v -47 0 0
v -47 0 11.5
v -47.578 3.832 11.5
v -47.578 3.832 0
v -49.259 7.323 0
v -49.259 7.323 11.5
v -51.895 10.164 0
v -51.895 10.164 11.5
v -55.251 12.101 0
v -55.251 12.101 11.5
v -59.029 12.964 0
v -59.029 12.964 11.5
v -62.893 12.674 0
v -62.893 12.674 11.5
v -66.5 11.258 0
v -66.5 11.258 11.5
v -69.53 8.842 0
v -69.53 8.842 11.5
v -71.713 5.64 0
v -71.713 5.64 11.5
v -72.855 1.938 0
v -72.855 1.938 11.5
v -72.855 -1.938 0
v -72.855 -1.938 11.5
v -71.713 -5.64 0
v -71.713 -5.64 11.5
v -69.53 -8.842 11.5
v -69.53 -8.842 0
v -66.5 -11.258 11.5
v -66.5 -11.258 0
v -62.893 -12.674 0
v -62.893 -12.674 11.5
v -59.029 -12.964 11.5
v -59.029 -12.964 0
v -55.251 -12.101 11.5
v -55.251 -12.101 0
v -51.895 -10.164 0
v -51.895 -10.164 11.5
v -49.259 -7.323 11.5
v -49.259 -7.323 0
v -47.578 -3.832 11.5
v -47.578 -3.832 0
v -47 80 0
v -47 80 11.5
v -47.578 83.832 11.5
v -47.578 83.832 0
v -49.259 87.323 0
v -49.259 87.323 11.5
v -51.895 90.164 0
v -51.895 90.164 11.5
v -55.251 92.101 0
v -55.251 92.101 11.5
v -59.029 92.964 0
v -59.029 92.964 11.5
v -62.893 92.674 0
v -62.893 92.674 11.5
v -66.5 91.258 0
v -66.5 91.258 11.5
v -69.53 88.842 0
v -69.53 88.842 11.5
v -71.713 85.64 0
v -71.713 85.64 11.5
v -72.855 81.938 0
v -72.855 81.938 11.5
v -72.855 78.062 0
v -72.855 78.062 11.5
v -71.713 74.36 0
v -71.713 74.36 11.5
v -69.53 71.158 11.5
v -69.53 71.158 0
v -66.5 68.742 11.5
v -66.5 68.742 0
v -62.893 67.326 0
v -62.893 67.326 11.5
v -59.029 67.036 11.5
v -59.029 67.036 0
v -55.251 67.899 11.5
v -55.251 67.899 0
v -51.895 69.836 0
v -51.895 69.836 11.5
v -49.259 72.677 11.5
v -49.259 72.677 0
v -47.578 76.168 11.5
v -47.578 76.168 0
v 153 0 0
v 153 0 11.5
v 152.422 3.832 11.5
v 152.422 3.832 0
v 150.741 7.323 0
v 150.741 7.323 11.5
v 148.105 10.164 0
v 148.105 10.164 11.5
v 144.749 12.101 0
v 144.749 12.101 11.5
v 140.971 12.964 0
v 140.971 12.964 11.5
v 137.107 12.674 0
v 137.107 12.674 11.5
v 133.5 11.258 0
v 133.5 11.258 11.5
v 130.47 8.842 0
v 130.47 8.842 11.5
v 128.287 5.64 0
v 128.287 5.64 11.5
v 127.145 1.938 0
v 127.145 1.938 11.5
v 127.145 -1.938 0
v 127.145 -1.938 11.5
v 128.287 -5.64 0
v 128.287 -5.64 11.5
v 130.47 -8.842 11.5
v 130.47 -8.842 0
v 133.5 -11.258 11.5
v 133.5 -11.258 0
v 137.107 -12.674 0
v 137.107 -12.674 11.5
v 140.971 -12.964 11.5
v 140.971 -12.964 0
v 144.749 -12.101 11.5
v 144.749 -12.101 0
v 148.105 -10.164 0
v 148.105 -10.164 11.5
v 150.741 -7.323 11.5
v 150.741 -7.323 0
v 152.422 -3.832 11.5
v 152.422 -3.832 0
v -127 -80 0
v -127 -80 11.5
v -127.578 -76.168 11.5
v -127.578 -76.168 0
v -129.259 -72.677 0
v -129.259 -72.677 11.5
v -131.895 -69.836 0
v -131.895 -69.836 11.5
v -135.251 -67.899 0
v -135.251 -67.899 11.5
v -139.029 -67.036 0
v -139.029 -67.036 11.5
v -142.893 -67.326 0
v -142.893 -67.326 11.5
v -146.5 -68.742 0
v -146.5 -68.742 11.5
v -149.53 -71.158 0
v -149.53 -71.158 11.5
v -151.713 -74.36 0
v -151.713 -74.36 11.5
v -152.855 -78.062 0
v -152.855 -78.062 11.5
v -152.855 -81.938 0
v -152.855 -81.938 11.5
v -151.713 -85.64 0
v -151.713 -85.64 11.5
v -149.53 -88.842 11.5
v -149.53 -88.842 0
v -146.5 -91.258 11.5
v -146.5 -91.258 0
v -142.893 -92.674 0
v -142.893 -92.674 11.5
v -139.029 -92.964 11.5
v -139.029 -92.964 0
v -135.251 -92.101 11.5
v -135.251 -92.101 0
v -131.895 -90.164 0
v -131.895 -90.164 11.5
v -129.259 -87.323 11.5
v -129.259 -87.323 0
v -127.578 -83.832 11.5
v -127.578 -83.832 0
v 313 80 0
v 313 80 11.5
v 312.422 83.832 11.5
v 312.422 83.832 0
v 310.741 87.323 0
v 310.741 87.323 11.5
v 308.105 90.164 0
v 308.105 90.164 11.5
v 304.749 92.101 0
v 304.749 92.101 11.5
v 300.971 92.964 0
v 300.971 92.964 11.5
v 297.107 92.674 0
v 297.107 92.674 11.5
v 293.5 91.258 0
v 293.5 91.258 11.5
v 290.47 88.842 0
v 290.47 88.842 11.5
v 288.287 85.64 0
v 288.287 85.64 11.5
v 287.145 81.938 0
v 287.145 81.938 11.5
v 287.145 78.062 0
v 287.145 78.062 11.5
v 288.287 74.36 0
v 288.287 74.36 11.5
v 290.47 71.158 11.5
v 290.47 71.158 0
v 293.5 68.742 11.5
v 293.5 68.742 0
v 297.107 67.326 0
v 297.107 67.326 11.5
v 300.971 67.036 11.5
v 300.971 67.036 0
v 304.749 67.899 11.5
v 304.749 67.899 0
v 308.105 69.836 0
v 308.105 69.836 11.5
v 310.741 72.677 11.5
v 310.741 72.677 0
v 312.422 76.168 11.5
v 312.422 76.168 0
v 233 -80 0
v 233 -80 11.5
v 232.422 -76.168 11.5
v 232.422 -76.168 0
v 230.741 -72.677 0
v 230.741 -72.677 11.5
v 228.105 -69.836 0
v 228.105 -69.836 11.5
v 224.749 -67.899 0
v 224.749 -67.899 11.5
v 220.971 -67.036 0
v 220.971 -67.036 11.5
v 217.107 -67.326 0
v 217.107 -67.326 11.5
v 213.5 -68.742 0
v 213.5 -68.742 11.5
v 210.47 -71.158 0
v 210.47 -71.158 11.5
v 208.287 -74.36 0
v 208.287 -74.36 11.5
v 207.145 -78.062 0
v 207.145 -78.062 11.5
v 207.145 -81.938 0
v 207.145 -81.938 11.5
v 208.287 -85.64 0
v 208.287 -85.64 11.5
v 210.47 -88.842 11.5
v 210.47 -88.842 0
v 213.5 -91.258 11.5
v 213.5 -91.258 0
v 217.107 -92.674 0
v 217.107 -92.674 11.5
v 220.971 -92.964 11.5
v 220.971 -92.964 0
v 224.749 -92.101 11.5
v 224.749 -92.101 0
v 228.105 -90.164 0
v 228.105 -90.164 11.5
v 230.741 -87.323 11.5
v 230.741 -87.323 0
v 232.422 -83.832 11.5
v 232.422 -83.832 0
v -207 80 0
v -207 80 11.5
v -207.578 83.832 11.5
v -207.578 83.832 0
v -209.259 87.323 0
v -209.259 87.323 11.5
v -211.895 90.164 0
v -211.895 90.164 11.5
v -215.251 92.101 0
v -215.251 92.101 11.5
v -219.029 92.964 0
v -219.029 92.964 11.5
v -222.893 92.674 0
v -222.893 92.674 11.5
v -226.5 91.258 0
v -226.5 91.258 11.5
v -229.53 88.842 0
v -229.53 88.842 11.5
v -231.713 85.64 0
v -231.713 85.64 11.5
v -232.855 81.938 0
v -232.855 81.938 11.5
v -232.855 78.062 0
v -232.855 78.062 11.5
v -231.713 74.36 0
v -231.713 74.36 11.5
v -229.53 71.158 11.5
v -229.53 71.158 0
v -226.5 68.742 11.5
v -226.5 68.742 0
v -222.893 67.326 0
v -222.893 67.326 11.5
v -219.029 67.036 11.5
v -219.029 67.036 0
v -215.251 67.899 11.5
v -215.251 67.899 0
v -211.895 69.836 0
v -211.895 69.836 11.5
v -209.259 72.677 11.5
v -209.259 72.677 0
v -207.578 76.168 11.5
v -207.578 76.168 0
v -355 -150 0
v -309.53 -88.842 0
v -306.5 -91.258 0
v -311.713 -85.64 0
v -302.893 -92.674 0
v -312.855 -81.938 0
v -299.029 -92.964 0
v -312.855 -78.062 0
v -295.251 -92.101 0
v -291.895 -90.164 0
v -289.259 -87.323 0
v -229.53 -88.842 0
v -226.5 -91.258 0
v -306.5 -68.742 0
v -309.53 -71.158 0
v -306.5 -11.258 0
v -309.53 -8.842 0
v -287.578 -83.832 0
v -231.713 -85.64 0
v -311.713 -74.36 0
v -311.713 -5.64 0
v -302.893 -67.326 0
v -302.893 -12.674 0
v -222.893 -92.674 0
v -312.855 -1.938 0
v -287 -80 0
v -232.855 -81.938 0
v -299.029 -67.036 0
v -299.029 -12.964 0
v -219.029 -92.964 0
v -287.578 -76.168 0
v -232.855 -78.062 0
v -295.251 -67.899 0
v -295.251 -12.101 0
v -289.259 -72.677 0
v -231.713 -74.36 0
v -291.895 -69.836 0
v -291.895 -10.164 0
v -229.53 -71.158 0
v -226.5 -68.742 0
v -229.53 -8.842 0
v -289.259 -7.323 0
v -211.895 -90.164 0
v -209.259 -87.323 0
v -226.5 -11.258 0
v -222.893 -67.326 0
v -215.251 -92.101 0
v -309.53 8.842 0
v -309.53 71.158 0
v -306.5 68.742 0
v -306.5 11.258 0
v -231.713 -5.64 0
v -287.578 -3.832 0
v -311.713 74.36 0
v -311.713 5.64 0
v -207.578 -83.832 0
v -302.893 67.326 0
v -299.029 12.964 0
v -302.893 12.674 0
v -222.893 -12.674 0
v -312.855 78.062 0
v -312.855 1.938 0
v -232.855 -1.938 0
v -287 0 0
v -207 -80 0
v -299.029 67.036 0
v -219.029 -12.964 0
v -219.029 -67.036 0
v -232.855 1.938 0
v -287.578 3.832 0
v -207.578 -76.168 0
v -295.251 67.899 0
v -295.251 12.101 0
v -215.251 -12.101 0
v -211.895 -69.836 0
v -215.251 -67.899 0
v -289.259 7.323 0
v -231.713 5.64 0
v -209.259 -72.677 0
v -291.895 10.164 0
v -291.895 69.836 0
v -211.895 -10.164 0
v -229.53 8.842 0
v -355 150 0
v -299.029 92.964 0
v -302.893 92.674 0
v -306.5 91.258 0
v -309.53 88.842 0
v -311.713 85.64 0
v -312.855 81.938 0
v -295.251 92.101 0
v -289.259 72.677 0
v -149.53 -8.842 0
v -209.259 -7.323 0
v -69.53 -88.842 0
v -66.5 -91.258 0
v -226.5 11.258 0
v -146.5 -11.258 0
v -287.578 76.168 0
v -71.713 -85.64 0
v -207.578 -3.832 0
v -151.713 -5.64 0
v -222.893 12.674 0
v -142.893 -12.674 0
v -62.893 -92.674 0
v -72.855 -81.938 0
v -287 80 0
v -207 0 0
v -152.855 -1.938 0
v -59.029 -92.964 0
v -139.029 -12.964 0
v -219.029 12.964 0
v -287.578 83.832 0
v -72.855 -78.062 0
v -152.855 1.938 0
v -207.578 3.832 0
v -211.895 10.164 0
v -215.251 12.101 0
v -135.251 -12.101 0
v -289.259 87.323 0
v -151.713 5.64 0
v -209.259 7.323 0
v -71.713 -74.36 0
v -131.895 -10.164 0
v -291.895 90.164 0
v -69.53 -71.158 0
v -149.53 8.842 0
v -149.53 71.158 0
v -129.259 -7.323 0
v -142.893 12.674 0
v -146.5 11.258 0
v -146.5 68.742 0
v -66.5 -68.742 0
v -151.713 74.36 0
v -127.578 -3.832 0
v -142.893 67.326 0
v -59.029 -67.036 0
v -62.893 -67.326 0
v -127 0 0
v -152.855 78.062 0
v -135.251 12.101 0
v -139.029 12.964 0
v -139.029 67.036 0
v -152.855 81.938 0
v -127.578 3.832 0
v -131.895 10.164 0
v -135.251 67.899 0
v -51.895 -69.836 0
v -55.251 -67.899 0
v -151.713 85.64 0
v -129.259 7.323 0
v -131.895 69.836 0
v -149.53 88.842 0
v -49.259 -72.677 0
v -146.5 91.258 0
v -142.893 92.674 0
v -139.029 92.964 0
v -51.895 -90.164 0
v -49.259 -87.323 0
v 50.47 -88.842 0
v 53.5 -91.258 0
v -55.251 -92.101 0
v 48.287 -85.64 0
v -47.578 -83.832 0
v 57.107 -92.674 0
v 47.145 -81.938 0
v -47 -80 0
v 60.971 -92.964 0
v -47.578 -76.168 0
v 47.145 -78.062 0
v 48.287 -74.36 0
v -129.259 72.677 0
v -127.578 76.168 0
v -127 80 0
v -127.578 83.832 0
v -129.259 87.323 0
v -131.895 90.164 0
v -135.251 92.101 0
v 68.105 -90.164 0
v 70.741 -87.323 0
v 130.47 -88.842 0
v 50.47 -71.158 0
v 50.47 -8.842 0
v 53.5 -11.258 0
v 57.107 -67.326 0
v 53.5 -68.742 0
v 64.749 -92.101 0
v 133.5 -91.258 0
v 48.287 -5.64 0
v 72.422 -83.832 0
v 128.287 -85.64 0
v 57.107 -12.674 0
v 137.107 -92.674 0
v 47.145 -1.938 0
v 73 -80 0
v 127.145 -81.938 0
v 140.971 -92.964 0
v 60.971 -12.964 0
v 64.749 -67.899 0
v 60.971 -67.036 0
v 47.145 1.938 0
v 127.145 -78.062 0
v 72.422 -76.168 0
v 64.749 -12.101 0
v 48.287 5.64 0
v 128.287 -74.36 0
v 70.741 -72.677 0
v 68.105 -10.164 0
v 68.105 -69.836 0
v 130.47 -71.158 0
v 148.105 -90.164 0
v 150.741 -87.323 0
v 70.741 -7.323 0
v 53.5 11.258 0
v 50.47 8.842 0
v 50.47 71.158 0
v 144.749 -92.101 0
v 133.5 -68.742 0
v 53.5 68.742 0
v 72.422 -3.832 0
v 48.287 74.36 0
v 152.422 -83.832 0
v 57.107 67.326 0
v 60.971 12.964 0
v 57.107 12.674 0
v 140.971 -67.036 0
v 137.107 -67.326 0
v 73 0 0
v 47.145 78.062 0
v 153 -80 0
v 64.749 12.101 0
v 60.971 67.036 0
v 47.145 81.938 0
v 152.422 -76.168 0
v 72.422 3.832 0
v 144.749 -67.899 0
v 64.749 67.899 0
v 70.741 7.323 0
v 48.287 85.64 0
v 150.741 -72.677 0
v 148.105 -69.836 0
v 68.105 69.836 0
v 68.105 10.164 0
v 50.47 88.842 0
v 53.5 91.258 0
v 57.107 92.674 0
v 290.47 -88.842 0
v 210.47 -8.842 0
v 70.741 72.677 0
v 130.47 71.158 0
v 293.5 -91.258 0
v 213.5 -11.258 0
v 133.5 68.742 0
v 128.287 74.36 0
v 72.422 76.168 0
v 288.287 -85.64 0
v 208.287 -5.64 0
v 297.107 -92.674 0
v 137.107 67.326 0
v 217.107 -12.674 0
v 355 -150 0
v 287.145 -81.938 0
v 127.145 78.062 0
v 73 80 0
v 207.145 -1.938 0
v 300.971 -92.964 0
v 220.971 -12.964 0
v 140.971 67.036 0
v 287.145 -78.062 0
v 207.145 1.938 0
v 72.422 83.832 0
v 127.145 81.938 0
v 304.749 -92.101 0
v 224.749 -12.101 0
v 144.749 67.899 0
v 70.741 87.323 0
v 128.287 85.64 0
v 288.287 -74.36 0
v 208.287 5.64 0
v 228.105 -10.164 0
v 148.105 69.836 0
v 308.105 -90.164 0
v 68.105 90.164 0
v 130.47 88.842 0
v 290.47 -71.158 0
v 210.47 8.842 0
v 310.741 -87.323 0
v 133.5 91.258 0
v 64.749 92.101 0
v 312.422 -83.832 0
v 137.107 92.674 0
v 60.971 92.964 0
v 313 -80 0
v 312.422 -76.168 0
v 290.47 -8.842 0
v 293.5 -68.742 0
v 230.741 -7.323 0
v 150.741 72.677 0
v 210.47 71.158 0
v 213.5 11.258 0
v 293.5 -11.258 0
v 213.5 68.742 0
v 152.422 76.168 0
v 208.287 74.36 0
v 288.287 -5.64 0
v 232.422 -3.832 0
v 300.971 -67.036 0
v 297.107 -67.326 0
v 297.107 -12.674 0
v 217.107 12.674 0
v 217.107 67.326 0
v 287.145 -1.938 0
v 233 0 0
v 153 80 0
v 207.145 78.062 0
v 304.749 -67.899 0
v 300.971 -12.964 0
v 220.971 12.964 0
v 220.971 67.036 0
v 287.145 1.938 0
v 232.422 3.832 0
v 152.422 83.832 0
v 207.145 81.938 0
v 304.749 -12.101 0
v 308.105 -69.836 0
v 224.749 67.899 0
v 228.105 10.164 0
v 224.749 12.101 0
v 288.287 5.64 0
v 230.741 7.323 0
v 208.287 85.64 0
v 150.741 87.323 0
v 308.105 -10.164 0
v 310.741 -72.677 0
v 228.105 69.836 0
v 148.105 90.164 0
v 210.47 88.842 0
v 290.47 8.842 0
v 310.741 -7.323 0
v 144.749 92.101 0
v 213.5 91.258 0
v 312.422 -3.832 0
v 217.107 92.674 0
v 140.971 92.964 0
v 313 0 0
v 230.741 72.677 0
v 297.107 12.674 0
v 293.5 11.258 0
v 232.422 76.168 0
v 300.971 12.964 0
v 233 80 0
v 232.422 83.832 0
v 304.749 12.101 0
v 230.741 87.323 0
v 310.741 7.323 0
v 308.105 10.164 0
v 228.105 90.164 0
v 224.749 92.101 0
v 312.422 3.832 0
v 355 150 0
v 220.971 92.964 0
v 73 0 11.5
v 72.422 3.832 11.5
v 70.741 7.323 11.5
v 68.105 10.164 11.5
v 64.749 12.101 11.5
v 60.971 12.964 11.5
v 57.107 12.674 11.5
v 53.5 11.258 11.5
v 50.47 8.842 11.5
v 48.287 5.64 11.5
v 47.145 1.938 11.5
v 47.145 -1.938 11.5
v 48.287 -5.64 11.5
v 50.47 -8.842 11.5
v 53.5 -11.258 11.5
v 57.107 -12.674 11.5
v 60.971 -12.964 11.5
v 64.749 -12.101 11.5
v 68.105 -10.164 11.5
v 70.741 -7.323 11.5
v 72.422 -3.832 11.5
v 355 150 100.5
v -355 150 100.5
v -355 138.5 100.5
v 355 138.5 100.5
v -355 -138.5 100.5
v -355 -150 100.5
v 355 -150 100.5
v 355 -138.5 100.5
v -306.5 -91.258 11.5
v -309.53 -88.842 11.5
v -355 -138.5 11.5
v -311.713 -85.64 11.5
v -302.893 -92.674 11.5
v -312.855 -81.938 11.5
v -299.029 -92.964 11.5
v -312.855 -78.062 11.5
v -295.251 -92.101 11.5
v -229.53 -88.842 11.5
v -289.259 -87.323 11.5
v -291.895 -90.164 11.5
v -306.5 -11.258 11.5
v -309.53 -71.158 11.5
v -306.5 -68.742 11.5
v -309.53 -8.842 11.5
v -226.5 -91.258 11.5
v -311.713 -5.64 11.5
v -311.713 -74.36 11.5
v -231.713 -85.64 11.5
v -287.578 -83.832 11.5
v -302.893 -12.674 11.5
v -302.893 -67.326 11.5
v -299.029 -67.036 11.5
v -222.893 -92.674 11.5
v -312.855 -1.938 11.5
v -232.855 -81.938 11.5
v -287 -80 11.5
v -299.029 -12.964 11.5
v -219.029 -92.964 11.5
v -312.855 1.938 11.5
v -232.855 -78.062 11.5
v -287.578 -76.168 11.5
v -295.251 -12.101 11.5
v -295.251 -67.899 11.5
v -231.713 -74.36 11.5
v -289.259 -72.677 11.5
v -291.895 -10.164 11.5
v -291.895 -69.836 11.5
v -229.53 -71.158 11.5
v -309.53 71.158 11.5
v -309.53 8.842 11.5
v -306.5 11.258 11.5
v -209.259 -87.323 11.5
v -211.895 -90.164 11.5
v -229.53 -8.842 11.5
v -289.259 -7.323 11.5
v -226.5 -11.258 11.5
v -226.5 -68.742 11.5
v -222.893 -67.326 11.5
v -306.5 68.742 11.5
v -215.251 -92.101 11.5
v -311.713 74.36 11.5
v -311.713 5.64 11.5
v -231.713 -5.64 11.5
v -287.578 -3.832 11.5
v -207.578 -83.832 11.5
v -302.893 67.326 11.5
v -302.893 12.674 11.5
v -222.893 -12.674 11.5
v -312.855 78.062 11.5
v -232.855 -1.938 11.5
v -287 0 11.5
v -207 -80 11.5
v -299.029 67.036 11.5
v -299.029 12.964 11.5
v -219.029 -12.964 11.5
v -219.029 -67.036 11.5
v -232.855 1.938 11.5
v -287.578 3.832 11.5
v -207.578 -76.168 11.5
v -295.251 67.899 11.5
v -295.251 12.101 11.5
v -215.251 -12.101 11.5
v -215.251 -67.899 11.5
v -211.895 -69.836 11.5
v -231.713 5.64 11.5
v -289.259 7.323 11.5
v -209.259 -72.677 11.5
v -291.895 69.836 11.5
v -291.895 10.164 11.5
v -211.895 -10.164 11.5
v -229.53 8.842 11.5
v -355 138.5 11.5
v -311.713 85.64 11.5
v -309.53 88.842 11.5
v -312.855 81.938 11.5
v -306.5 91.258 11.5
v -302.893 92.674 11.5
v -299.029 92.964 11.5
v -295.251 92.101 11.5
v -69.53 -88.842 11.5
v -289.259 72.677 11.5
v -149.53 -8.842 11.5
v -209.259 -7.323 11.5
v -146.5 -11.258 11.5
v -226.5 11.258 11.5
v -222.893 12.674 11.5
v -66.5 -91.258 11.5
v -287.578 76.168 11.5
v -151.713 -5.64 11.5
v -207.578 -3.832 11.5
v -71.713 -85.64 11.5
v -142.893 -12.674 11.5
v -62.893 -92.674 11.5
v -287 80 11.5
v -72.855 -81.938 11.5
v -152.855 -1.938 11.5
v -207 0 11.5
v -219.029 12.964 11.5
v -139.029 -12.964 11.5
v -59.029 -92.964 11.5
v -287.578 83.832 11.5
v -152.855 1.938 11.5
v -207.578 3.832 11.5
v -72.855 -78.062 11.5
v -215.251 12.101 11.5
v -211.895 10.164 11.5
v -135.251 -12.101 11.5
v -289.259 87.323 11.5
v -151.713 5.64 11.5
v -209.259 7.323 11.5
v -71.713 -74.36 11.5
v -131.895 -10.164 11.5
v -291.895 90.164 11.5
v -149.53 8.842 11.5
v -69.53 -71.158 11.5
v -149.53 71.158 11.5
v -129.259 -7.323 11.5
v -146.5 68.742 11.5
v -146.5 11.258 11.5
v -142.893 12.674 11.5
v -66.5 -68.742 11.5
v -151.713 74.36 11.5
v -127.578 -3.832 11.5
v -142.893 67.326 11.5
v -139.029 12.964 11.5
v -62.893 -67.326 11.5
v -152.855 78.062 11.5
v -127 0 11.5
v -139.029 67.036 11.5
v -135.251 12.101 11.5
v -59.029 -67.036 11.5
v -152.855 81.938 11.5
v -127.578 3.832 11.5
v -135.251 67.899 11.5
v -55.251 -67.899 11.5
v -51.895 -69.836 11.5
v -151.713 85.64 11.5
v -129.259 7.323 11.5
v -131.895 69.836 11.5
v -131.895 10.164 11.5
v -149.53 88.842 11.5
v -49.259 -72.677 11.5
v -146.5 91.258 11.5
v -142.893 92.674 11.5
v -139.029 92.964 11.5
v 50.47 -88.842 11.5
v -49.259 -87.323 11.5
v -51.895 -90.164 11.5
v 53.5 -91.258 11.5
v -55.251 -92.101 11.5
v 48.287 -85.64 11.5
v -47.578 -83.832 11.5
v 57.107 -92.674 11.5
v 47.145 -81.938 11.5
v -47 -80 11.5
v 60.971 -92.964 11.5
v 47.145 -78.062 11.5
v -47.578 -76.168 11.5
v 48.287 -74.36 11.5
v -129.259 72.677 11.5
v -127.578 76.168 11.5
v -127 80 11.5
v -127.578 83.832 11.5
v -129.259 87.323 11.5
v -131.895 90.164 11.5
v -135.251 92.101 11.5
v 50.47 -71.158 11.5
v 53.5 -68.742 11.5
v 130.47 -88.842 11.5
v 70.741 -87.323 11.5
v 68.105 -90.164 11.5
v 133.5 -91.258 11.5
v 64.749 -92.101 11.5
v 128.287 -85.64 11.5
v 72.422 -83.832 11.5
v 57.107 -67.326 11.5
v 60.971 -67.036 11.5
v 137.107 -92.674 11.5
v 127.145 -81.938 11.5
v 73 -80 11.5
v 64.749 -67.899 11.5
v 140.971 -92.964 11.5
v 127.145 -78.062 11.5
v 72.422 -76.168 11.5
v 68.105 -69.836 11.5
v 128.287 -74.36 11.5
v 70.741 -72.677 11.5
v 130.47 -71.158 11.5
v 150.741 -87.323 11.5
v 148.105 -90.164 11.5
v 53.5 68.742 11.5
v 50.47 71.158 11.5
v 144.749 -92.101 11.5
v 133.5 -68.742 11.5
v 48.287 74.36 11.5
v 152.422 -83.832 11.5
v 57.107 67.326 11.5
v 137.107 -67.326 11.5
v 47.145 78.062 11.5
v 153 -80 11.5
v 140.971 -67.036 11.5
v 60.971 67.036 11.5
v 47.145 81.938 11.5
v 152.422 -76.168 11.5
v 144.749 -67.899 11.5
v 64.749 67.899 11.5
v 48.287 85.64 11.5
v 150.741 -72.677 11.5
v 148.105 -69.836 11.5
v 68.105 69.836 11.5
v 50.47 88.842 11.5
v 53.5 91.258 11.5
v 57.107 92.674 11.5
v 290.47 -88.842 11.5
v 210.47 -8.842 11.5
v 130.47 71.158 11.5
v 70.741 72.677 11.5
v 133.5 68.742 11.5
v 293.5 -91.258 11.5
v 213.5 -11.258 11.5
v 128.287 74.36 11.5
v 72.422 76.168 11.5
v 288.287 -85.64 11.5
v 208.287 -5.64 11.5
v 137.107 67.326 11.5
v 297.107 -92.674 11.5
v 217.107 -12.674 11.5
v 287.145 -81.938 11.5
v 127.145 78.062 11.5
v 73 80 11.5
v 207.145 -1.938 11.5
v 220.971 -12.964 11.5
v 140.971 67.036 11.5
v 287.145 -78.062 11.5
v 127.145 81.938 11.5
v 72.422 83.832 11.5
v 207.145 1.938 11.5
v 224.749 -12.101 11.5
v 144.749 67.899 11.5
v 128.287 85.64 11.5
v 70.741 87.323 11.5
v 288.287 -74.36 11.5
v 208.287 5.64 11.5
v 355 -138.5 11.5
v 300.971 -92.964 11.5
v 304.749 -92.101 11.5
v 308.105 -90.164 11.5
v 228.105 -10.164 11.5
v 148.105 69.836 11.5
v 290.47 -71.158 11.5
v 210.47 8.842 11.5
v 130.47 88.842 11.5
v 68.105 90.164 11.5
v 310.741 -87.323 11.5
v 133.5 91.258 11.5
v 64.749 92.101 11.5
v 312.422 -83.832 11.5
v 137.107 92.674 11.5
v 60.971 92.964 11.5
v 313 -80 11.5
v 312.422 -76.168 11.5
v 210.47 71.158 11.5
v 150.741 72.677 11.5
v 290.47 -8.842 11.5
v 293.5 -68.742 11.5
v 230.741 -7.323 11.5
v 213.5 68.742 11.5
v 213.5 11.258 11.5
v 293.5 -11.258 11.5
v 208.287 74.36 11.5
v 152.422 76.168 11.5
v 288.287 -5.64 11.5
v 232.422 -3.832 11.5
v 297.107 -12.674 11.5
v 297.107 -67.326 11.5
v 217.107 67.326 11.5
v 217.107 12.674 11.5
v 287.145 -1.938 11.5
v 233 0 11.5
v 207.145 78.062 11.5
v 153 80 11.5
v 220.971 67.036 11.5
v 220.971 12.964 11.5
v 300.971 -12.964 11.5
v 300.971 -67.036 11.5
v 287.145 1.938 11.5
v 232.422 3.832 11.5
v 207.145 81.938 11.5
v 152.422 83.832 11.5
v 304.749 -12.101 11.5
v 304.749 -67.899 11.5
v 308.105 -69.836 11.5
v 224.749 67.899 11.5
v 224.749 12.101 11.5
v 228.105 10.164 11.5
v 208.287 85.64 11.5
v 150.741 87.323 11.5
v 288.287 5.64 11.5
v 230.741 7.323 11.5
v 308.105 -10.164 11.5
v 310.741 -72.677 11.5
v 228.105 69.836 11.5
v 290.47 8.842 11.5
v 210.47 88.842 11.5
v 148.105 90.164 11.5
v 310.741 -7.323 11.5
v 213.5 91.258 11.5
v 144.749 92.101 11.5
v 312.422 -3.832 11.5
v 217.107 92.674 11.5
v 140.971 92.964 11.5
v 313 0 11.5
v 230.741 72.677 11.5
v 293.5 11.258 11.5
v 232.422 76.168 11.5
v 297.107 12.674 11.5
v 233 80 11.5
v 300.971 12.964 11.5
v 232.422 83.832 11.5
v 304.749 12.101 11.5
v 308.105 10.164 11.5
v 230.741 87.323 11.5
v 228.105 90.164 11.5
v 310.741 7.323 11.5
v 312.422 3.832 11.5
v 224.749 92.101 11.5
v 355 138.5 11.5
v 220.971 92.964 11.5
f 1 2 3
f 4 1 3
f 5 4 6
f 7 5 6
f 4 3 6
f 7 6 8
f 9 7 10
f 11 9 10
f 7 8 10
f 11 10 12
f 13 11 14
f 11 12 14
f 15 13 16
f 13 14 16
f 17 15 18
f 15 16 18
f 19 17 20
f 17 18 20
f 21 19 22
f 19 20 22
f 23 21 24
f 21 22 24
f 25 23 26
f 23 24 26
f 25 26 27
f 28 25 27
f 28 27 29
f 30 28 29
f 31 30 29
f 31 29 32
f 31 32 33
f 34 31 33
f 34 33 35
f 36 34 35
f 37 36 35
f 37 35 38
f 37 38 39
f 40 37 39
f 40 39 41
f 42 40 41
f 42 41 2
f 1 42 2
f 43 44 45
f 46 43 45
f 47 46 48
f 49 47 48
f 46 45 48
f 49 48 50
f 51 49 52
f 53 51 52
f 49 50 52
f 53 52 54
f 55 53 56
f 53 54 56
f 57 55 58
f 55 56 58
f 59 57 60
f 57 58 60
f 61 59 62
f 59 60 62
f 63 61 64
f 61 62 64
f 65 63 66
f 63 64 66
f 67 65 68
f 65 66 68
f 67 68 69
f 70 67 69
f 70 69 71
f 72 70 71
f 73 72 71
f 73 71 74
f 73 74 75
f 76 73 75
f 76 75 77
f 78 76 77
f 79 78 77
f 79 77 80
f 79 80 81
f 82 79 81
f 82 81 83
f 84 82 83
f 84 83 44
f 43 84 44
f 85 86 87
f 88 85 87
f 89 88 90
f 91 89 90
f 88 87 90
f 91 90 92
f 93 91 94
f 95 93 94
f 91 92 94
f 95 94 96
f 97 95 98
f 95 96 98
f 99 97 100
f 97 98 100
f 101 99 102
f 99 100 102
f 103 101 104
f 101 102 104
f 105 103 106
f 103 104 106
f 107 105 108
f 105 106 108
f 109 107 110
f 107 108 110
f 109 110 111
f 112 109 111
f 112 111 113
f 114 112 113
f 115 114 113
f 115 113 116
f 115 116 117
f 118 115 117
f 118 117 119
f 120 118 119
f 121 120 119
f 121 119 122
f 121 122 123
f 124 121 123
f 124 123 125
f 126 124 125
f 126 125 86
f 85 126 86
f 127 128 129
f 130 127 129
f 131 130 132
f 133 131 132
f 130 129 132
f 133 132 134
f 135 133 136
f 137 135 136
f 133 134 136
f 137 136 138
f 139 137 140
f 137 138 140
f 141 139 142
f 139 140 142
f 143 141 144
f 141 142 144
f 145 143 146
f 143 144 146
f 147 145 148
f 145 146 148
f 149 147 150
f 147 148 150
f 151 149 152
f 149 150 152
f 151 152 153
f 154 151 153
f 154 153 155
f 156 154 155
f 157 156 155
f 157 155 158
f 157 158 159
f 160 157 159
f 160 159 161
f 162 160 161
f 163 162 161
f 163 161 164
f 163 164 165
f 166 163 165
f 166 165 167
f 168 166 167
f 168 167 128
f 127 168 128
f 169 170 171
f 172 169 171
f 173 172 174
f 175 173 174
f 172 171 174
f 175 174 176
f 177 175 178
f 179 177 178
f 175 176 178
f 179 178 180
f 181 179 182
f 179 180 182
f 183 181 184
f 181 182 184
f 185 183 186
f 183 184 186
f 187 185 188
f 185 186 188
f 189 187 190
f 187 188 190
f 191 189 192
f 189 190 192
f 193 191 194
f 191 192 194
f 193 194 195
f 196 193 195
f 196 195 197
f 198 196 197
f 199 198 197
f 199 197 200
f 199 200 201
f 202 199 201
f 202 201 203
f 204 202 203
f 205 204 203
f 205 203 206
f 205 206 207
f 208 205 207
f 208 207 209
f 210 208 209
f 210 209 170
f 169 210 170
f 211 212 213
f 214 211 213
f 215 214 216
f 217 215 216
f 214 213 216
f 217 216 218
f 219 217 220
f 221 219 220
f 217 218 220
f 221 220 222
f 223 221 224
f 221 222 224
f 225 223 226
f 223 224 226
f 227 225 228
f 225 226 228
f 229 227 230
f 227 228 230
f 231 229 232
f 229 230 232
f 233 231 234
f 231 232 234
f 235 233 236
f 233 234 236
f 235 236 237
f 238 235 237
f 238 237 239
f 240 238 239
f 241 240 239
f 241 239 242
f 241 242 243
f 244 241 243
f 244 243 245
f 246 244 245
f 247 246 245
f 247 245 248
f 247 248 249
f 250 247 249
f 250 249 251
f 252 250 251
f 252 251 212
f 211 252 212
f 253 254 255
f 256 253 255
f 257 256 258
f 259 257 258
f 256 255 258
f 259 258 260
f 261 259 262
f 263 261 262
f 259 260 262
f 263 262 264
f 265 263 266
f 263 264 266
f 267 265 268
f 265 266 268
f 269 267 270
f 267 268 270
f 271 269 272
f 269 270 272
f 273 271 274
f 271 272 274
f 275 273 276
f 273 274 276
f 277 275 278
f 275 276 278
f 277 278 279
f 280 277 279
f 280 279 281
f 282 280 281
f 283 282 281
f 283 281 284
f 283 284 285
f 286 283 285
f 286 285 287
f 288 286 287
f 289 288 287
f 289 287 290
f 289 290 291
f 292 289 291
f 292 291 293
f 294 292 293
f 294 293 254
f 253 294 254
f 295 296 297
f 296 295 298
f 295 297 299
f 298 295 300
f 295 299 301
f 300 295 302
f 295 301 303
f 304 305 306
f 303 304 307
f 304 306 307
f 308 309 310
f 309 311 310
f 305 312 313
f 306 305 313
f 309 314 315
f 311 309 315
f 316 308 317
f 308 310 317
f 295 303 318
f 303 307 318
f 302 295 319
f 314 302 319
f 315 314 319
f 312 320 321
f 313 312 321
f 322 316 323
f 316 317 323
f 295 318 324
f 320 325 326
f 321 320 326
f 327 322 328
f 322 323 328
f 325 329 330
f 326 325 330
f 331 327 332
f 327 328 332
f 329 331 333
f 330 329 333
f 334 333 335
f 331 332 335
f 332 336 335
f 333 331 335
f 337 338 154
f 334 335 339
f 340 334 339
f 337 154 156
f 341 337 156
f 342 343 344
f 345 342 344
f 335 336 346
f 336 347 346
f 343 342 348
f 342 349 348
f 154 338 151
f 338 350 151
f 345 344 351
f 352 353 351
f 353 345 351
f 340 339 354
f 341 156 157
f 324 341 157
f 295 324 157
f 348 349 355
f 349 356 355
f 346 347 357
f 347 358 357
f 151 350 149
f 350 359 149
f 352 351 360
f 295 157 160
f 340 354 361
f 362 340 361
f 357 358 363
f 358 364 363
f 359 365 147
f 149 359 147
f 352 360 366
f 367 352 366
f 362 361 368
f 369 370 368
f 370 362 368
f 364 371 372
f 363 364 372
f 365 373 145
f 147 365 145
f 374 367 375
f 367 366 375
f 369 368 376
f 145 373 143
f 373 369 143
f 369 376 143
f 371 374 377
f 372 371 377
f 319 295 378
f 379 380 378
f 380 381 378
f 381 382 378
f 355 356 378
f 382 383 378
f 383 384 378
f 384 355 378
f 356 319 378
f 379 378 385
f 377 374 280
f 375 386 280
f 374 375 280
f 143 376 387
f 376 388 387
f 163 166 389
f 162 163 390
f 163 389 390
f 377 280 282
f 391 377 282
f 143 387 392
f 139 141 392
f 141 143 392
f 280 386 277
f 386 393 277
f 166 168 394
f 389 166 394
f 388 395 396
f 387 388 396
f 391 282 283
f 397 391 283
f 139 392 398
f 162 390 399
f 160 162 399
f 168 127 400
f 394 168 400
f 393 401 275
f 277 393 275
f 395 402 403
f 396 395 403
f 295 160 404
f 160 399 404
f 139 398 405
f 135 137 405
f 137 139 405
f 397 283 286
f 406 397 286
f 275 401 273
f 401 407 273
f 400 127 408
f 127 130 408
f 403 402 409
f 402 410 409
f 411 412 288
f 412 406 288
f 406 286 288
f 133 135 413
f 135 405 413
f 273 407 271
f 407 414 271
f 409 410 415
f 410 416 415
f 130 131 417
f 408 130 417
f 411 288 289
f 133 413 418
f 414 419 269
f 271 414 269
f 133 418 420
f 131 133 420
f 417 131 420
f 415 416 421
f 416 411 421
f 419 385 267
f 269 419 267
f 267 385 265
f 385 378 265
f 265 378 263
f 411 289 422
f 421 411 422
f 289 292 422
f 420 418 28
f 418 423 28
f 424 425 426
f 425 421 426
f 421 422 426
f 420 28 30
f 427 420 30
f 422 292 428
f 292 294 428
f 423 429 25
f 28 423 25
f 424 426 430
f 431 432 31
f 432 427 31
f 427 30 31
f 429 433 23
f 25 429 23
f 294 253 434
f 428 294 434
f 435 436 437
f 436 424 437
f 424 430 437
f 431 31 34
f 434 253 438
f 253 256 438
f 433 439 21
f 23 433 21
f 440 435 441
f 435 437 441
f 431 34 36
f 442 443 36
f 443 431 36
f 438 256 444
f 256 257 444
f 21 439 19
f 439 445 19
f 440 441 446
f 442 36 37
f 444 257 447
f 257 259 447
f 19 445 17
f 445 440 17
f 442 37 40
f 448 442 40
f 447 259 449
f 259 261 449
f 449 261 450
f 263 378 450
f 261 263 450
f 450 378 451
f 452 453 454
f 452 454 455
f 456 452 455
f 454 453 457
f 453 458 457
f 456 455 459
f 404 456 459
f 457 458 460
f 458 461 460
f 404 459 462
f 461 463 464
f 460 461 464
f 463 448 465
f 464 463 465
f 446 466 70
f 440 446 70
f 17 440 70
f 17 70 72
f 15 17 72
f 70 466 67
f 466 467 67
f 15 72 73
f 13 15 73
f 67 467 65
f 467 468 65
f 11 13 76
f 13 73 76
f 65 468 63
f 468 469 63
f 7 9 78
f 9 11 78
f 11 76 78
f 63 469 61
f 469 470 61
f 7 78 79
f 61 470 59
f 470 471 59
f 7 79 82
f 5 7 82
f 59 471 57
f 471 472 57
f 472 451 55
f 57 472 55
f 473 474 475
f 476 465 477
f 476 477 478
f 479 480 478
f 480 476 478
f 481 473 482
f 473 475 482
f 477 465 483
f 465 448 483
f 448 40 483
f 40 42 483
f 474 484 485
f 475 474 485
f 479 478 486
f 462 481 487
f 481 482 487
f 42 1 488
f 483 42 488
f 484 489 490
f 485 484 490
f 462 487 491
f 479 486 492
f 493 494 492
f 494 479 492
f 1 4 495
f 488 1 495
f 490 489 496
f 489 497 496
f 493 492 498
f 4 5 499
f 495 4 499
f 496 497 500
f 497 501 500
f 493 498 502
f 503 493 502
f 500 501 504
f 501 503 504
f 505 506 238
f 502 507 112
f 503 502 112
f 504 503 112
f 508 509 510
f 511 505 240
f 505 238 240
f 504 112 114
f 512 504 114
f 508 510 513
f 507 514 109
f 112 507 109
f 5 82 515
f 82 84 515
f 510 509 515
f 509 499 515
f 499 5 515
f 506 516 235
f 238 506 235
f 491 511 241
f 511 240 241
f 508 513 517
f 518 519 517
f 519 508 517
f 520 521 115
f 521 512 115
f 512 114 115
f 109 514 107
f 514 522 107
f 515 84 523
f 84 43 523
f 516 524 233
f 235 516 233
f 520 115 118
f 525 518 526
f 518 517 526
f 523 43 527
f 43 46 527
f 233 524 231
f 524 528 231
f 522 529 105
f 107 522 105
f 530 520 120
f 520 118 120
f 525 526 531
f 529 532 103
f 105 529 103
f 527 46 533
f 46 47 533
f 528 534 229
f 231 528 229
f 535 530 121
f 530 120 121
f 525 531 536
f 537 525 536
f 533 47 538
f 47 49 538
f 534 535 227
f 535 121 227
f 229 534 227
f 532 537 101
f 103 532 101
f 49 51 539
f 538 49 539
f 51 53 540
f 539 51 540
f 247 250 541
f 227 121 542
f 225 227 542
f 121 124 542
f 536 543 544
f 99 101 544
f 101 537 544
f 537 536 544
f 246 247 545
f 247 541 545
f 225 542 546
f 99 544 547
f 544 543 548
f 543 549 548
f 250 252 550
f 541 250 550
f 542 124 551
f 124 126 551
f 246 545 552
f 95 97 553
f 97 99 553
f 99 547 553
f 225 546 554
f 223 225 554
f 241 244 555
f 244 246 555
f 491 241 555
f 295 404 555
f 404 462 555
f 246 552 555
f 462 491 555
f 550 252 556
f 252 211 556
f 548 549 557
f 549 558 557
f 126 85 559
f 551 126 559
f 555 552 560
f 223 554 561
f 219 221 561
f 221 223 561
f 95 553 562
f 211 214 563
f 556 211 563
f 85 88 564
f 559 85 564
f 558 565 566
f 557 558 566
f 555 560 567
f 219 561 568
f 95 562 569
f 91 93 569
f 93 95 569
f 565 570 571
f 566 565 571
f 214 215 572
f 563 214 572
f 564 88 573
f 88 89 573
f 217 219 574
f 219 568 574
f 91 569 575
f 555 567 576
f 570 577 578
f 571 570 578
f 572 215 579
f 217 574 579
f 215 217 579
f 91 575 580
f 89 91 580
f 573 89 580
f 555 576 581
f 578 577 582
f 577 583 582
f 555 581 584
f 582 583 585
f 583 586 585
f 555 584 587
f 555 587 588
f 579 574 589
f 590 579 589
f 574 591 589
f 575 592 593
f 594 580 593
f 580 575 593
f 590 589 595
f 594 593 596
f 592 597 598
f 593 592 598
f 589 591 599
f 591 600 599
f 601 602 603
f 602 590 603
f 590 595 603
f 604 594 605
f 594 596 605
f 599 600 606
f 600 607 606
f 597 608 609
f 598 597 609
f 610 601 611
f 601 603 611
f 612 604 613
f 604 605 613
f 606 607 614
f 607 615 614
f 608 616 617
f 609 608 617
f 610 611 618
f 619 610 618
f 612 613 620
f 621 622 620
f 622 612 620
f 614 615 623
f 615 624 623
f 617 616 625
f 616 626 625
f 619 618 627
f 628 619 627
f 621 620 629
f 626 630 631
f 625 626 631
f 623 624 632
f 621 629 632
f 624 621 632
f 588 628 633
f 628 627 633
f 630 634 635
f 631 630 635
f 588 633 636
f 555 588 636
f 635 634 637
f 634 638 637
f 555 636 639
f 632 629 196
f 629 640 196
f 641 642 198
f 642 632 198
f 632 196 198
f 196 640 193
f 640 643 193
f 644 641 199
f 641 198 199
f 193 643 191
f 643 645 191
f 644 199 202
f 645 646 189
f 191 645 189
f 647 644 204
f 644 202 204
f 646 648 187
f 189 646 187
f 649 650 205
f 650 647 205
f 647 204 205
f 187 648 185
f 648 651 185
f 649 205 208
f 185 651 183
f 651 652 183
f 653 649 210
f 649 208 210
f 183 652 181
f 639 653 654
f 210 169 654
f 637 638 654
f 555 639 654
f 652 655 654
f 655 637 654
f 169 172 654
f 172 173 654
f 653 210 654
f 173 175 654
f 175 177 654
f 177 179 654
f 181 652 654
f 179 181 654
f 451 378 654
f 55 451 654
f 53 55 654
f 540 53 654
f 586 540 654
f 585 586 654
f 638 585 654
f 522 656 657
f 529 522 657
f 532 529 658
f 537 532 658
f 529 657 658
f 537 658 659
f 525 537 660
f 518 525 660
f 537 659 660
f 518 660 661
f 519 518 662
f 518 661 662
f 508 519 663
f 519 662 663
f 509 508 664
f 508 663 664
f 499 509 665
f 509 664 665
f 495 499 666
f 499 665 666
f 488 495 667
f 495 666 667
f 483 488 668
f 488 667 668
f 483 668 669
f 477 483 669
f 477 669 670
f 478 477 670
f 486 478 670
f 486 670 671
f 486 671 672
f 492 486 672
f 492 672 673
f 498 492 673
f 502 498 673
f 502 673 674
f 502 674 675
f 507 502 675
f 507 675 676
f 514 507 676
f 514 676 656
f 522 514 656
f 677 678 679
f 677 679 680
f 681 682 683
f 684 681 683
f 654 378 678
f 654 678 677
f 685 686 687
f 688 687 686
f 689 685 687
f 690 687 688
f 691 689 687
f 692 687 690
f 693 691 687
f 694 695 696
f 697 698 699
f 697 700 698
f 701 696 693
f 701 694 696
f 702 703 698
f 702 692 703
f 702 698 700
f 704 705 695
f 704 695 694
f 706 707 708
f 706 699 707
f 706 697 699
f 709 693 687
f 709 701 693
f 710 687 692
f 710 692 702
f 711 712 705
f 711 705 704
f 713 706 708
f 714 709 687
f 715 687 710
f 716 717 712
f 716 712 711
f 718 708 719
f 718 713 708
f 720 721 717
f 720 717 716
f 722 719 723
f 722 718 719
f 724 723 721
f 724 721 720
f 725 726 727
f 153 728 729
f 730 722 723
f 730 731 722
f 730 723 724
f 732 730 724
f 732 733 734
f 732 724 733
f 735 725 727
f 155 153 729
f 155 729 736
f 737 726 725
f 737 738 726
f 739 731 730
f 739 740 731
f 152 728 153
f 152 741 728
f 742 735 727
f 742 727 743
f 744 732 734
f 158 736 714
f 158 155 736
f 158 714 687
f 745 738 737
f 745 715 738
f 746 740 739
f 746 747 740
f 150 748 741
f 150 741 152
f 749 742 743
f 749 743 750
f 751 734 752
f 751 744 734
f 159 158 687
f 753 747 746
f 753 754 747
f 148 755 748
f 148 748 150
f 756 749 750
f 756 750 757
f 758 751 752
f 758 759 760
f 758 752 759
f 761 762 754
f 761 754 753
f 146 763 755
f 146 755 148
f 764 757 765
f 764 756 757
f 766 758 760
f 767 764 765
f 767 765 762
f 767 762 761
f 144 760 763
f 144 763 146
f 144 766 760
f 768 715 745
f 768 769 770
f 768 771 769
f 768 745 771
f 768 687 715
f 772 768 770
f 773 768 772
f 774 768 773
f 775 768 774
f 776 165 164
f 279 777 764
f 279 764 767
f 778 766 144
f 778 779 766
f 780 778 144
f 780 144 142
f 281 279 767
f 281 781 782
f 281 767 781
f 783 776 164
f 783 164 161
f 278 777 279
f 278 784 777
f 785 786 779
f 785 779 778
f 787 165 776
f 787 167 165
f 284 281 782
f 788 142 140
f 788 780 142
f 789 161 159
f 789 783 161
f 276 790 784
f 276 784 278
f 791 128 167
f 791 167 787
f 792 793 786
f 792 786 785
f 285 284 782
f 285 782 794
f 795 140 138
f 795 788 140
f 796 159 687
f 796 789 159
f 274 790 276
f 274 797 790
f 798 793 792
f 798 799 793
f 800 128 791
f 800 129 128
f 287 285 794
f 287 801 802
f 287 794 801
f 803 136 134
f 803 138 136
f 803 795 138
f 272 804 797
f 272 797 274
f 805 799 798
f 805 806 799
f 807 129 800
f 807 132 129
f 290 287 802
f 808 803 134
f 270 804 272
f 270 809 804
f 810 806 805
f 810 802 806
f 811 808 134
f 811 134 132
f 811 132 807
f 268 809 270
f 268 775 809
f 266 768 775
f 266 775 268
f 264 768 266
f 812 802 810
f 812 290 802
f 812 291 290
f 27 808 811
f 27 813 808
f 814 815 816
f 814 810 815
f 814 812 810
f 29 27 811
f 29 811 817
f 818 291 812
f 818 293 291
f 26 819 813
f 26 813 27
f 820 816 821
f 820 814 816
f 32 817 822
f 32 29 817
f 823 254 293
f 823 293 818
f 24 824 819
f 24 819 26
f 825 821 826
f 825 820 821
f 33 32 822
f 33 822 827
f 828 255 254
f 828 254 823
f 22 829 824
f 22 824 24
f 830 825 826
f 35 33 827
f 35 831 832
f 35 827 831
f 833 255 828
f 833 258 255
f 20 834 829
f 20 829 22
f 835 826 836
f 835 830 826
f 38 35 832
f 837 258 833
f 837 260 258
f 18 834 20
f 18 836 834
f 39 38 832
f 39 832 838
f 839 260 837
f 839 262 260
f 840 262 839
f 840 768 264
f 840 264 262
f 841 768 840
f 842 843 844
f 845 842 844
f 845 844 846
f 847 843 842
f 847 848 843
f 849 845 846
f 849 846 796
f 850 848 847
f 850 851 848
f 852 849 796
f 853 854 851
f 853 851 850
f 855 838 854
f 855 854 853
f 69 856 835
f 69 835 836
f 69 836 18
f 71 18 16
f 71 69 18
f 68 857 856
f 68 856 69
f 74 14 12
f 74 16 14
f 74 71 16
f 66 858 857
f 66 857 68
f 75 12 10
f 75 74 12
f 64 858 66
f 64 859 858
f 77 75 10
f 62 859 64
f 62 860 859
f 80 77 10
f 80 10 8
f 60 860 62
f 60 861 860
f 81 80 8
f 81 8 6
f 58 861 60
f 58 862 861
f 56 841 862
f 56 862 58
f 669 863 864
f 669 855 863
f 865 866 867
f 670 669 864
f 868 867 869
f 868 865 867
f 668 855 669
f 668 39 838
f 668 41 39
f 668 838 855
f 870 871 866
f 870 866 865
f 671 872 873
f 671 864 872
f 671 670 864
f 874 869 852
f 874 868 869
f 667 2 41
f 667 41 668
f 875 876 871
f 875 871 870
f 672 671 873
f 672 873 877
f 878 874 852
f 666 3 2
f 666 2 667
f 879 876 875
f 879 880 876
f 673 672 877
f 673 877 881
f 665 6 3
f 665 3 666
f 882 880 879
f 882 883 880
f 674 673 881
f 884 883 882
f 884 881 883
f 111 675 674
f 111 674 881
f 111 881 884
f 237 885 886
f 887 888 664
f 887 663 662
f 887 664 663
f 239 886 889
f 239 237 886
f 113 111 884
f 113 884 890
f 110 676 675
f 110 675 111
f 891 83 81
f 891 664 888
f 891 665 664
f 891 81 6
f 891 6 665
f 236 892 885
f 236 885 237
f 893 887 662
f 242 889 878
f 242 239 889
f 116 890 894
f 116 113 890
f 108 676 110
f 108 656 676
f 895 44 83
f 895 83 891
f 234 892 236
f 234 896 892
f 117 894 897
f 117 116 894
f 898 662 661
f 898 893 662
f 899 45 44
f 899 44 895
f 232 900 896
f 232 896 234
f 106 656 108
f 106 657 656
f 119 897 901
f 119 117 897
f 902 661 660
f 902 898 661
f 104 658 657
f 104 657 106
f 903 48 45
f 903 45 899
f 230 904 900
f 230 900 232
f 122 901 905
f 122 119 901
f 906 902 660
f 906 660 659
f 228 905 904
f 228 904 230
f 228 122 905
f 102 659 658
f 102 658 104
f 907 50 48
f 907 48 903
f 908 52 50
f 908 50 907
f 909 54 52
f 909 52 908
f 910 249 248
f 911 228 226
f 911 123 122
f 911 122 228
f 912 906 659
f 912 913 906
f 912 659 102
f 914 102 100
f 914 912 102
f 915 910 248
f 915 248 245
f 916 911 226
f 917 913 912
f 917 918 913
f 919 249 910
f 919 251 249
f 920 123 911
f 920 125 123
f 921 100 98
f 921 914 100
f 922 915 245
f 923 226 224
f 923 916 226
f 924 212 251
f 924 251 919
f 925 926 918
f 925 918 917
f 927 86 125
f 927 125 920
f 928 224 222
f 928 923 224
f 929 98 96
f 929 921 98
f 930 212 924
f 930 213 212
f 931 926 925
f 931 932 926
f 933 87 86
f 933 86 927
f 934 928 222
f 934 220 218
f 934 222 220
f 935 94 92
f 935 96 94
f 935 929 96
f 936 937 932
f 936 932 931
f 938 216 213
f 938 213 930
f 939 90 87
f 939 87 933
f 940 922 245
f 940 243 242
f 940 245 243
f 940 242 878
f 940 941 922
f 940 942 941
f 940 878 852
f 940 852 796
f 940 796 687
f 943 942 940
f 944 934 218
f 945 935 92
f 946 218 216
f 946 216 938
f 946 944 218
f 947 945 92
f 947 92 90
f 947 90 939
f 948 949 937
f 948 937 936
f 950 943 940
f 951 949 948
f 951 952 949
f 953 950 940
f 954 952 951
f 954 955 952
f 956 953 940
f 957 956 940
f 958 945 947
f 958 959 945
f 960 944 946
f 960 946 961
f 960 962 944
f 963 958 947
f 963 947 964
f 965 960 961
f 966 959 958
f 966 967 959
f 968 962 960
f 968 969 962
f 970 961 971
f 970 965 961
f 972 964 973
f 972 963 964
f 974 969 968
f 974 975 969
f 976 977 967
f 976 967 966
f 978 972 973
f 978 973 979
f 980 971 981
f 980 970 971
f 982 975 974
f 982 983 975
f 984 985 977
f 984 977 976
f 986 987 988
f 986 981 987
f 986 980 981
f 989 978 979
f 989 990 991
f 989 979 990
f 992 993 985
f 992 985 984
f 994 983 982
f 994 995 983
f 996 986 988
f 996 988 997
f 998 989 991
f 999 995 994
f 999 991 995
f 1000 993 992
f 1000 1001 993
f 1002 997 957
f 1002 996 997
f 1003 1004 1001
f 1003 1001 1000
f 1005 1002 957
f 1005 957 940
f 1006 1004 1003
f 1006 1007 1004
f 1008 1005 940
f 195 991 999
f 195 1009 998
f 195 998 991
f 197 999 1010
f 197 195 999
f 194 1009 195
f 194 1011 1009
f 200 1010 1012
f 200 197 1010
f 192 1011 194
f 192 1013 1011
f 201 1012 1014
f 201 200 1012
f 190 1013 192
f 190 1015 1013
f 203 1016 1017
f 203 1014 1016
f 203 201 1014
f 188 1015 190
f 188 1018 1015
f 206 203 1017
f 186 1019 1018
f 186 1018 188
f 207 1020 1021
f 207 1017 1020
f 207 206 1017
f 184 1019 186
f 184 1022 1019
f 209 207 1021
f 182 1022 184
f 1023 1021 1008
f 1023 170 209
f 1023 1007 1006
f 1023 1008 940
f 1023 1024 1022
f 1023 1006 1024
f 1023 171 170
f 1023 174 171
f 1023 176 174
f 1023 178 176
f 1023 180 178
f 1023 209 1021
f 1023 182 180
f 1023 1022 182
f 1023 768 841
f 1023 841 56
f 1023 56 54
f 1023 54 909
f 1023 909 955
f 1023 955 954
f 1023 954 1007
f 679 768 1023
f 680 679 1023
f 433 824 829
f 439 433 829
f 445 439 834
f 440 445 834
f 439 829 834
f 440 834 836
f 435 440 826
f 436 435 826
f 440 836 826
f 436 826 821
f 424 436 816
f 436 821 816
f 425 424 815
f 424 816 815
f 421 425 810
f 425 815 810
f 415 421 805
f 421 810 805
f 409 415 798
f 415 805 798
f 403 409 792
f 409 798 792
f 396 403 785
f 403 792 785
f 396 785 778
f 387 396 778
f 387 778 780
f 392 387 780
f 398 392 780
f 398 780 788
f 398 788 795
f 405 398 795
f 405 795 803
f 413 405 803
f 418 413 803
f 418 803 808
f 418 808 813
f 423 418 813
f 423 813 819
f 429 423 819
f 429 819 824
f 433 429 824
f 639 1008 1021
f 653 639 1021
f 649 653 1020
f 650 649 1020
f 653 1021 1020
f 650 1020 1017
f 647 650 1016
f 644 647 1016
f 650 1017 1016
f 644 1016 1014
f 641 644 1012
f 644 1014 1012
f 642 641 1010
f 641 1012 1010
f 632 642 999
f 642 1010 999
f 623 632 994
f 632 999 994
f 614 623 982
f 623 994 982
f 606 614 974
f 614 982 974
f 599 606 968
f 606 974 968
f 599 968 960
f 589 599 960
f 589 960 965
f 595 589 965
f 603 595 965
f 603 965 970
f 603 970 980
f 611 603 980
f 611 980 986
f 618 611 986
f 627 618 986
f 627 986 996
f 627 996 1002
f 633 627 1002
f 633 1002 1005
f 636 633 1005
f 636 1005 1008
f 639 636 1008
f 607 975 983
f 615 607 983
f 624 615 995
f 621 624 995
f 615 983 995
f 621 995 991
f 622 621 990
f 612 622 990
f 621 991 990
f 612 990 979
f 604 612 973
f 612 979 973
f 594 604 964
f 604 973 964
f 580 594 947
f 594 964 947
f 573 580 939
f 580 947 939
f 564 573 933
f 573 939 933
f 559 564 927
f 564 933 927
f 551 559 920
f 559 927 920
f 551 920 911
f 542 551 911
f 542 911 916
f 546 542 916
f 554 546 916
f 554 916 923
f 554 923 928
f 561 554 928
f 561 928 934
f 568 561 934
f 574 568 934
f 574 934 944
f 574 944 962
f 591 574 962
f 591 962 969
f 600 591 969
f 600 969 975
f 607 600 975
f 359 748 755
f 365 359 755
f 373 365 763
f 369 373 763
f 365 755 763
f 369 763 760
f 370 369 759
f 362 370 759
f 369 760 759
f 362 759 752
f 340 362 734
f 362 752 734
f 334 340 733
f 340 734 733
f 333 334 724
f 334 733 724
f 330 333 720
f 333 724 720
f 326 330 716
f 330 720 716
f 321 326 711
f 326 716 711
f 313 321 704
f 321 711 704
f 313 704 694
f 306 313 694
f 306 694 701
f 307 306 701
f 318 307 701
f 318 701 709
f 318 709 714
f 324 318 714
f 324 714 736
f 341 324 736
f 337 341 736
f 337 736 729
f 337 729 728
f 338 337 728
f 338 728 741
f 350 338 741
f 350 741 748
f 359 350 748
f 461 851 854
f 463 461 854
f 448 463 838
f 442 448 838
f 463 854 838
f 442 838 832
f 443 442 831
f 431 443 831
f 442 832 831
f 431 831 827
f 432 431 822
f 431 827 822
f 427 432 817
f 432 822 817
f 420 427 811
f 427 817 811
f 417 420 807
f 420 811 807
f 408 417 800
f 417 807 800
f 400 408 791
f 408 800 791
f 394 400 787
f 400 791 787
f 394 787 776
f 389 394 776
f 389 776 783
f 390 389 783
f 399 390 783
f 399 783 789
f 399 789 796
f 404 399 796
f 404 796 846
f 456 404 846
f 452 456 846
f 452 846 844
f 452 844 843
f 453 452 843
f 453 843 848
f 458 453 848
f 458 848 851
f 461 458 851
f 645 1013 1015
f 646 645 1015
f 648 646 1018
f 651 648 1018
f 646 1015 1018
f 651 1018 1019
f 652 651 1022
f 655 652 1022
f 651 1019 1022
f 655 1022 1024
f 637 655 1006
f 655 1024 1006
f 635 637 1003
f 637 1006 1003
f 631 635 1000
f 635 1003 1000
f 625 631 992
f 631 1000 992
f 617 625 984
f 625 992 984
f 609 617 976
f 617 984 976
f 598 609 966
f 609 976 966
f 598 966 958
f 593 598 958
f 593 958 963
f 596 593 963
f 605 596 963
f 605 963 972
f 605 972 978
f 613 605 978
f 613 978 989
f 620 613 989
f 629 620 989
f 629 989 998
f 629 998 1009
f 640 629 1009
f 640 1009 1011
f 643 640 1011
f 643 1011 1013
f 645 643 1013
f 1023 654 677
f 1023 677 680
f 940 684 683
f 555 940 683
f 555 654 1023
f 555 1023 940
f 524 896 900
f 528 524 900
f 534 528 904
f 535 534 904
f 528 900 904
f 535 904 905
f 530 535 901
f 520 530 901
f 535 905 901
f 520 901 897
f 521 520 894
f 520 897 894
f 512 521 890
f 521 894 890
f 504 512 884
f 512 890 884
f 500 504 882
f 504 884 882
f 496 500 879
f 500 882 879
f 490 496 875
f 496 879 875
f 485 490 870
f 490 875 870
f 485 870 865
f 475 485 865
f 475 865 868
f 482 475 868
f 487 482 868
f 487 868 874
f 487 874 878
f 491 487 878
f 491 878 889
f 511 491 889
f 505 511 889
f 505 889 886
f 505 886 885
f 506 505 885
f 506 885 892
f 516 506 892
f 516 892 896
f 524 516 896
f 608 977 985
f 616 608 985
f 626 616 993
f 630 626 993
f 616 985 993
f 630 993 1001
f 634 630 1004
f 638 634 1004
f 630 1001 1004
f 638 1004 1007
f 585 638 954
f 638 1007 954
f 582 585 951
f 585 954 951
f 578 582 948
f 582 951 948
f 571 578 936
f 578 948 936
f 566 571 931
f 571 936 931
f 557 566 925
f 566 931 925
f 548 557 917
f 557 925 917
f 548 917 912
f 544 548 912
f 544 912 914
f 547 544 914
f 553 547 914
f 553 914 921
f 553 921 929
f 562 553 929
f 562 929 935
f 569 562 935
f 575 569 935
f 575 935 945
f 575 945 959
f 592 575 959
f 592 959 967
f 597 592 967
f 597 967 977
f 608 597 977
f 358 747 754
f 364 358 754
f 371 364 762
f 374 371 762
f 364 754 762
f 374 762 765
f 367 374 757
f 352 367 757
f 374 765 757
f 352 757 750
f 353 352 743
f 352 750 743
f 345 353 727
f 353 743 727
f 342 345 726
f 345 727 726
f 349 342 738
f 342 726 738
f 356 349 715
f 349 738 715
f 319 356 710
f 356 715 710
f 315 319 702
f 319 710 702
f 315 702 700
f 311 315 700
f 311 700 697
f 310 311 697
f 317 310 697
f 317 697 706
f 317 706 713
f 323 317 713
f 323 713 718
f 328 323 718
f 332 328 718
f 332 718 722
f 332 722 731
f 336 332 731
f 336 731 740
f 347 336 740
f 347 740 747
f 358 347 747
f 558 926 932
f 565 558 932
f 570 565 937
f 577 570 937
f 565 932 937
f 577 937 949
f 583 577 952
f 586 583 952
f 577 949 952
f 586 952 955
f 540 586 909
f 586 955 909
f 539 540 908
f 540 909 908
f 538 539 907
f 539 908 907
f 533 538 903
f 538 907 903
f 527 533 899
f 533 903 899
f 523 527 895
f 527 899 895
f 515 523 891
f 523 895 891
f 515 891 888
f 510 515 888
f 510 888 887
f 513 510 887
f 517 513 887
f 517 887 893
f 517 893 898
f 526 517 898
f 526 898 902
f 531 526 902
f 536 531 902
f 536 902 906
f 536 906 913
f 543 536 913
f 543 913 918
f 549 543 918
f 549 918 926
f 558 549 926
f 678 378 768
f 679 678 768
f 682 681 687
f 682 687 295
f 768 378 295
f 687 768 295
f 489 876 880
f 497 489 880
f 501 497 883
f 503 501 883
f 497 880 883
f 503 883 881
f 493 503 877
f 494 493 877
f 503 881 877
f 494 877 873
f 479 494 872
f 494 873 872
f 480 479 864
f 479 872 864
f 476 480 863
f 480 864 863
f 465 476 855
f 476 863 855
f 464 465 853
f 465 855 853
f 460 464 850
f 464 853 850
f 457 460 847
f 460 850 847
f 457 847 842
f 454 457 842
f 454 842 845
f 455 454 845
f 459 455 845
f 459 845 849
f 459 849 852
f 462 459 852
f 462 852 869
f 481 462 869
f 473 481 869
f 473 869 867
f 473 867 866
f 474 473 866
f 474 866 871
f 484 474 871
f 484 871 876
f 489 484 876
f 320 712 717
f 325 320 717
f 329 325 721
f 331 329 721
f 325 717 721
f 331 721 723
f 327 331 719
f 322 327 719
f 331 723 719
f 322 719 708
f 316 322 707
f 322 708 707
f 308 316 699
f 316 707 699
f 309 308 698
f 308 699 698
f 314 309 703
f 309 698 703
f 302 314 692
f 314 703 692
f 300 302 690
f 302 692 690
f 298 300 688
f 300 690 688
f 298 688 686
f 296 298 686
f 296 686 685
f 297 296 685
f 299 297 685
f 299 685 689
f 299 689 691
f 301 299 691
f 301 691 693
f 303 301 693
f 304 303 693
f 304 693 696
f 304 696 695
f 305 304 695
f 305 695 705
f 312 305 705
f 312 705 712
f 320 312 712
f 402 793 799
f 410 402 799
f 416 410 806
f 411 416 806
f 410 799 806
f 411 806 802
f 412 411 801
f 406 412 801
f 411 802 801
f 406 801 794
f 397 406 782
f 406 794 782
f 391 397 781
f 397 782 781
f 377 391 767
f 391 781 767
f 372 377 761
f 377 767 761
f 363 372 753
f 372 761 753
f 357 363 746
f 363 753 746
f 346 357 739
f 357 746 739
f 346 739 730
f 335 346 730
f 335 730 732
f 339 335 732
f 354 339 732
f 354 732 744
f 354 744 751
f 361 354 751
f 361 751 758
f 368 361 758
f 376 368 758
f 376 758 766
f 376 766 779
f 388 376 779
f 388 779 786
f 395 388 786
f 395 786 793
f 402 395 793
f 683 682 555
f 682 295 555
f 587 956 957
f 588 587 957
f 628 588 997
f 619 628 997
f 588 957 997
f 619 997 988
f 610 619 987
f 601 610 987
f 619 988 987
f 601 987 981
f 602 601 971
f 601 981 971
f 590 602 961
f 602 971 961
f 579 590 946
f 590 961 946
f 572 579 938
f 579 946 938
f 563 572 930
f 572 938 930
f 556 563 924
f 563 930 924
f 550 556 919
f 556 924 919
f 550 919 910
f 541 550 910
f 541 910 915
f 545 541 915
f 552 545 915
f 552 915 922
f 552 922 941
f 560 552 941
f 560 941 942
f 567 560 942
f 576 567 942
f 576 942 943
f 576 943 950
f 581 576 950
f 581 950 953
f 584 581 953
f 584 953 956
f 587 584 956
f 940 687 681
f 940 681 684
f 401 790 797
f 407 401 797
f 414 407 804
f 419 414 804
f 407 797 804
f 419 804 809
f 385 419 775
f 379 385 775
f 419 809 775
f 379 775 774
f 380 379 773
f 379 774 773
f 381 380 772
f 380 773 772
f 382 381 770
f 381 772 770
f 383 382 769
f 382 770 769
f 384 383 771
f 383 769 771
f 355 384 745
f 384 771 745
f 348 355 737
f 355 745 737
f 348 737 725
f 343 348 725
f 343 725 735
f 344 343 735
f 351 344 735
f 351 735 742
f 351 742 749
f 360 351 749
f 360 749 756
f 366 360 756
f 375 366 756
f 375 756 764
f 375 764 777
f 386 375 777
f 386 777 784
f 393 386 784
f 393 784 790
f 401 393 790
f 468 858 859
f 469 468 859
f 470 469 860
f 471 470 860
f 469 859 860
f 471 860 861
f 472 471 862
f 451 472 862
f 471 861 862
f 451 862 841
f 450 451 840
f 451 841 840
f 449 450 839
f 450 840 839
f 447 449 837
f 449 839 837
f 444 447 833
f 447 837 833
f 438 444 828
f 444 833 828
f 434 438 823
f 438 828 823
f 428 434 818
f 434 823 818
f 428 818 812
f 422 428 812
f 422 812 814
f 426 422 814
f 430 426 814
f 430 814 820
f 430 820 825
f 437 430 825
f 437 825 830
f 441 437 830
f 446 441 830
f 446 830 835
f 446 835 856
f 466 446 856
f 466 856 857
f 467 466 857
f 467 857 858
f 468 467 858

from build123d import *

# Parameters (mm, degrees)
SKETCH_1_W                  = 710
SKETCH_1_H                  = 300
EXTRUDE_1_DEPTH             = 11.5
SKETCH_2_R                  = 13
CUT_EXTRUDE_1_DEPTH         = 386.560954973
PATTERN_LINEAR_1_COUNT      = 4
PATTERN_LINEAR_1_PITCH      = 80
PATTERN_LINEAR_1_COUNT_DIR2 = 3
PATTERN_LINEAR_1_PITCH_DIR2 = 80
SKETCH_3_W                  = 710
SKETCH_3_H                  = 11.5
EXTRUDE_2_DEPTH             = 89


with BuildPart() as part:
    # 草图1 → 凸台-拉伸1 (new body)
    with BuildSketch(Plane.XY):
        Rectangle(SKETCH_1_W, SKETCH_1_H)
    extrude(amount=EXTRUDE_1_DEPTH)

    # 草图2 → 切除-拉伸1 (cut, through all)
    with BuildSketch(Plane.XY.offset(11.5)):
        with Locations((-300, 80)):
            Circle(SKETCH_2_R)
        with Locations((60, 80)):
            Circle(SKETCH_2_R)
    cut_extrude_1 = extrude(amount=-CUT_EXTRUDE_1_DEPTH, mode=Mode.SUBTRACT)

    # 阵列(线性)1: Cut-Extrude 1 4 × 3
    with Locations(*[(i * PATTERN_LINEAR_1_PITCH, -j * PATTERN_LINEAR_1_PITCH_DIR2, 0) for i in range(PATTERN_LINEAR_1_COUNT) for j in range(PATTERN_LINEAR_1_COUNT_DIR2) if (i, j) != (0, 0)]):
        add(cut_extrude_1, mode=Mode.SUBTRACT)

    # 草图3 → 凸台-拉伸2 (add)
    with BuildSketch(Plane.XY.offset(11.5)):
        with Locations((0, 144.25)):
            Rectangle(SKETCH_3_W, SKETCH_3_H)
    extrude_2 = extrude(amount=EXTRUDE_2_DEPTH)

    # 镜向1: 凸台-拉伸2 across plane
    add(extrude_2.mirror(Plane.ZX))


solid = part.part
